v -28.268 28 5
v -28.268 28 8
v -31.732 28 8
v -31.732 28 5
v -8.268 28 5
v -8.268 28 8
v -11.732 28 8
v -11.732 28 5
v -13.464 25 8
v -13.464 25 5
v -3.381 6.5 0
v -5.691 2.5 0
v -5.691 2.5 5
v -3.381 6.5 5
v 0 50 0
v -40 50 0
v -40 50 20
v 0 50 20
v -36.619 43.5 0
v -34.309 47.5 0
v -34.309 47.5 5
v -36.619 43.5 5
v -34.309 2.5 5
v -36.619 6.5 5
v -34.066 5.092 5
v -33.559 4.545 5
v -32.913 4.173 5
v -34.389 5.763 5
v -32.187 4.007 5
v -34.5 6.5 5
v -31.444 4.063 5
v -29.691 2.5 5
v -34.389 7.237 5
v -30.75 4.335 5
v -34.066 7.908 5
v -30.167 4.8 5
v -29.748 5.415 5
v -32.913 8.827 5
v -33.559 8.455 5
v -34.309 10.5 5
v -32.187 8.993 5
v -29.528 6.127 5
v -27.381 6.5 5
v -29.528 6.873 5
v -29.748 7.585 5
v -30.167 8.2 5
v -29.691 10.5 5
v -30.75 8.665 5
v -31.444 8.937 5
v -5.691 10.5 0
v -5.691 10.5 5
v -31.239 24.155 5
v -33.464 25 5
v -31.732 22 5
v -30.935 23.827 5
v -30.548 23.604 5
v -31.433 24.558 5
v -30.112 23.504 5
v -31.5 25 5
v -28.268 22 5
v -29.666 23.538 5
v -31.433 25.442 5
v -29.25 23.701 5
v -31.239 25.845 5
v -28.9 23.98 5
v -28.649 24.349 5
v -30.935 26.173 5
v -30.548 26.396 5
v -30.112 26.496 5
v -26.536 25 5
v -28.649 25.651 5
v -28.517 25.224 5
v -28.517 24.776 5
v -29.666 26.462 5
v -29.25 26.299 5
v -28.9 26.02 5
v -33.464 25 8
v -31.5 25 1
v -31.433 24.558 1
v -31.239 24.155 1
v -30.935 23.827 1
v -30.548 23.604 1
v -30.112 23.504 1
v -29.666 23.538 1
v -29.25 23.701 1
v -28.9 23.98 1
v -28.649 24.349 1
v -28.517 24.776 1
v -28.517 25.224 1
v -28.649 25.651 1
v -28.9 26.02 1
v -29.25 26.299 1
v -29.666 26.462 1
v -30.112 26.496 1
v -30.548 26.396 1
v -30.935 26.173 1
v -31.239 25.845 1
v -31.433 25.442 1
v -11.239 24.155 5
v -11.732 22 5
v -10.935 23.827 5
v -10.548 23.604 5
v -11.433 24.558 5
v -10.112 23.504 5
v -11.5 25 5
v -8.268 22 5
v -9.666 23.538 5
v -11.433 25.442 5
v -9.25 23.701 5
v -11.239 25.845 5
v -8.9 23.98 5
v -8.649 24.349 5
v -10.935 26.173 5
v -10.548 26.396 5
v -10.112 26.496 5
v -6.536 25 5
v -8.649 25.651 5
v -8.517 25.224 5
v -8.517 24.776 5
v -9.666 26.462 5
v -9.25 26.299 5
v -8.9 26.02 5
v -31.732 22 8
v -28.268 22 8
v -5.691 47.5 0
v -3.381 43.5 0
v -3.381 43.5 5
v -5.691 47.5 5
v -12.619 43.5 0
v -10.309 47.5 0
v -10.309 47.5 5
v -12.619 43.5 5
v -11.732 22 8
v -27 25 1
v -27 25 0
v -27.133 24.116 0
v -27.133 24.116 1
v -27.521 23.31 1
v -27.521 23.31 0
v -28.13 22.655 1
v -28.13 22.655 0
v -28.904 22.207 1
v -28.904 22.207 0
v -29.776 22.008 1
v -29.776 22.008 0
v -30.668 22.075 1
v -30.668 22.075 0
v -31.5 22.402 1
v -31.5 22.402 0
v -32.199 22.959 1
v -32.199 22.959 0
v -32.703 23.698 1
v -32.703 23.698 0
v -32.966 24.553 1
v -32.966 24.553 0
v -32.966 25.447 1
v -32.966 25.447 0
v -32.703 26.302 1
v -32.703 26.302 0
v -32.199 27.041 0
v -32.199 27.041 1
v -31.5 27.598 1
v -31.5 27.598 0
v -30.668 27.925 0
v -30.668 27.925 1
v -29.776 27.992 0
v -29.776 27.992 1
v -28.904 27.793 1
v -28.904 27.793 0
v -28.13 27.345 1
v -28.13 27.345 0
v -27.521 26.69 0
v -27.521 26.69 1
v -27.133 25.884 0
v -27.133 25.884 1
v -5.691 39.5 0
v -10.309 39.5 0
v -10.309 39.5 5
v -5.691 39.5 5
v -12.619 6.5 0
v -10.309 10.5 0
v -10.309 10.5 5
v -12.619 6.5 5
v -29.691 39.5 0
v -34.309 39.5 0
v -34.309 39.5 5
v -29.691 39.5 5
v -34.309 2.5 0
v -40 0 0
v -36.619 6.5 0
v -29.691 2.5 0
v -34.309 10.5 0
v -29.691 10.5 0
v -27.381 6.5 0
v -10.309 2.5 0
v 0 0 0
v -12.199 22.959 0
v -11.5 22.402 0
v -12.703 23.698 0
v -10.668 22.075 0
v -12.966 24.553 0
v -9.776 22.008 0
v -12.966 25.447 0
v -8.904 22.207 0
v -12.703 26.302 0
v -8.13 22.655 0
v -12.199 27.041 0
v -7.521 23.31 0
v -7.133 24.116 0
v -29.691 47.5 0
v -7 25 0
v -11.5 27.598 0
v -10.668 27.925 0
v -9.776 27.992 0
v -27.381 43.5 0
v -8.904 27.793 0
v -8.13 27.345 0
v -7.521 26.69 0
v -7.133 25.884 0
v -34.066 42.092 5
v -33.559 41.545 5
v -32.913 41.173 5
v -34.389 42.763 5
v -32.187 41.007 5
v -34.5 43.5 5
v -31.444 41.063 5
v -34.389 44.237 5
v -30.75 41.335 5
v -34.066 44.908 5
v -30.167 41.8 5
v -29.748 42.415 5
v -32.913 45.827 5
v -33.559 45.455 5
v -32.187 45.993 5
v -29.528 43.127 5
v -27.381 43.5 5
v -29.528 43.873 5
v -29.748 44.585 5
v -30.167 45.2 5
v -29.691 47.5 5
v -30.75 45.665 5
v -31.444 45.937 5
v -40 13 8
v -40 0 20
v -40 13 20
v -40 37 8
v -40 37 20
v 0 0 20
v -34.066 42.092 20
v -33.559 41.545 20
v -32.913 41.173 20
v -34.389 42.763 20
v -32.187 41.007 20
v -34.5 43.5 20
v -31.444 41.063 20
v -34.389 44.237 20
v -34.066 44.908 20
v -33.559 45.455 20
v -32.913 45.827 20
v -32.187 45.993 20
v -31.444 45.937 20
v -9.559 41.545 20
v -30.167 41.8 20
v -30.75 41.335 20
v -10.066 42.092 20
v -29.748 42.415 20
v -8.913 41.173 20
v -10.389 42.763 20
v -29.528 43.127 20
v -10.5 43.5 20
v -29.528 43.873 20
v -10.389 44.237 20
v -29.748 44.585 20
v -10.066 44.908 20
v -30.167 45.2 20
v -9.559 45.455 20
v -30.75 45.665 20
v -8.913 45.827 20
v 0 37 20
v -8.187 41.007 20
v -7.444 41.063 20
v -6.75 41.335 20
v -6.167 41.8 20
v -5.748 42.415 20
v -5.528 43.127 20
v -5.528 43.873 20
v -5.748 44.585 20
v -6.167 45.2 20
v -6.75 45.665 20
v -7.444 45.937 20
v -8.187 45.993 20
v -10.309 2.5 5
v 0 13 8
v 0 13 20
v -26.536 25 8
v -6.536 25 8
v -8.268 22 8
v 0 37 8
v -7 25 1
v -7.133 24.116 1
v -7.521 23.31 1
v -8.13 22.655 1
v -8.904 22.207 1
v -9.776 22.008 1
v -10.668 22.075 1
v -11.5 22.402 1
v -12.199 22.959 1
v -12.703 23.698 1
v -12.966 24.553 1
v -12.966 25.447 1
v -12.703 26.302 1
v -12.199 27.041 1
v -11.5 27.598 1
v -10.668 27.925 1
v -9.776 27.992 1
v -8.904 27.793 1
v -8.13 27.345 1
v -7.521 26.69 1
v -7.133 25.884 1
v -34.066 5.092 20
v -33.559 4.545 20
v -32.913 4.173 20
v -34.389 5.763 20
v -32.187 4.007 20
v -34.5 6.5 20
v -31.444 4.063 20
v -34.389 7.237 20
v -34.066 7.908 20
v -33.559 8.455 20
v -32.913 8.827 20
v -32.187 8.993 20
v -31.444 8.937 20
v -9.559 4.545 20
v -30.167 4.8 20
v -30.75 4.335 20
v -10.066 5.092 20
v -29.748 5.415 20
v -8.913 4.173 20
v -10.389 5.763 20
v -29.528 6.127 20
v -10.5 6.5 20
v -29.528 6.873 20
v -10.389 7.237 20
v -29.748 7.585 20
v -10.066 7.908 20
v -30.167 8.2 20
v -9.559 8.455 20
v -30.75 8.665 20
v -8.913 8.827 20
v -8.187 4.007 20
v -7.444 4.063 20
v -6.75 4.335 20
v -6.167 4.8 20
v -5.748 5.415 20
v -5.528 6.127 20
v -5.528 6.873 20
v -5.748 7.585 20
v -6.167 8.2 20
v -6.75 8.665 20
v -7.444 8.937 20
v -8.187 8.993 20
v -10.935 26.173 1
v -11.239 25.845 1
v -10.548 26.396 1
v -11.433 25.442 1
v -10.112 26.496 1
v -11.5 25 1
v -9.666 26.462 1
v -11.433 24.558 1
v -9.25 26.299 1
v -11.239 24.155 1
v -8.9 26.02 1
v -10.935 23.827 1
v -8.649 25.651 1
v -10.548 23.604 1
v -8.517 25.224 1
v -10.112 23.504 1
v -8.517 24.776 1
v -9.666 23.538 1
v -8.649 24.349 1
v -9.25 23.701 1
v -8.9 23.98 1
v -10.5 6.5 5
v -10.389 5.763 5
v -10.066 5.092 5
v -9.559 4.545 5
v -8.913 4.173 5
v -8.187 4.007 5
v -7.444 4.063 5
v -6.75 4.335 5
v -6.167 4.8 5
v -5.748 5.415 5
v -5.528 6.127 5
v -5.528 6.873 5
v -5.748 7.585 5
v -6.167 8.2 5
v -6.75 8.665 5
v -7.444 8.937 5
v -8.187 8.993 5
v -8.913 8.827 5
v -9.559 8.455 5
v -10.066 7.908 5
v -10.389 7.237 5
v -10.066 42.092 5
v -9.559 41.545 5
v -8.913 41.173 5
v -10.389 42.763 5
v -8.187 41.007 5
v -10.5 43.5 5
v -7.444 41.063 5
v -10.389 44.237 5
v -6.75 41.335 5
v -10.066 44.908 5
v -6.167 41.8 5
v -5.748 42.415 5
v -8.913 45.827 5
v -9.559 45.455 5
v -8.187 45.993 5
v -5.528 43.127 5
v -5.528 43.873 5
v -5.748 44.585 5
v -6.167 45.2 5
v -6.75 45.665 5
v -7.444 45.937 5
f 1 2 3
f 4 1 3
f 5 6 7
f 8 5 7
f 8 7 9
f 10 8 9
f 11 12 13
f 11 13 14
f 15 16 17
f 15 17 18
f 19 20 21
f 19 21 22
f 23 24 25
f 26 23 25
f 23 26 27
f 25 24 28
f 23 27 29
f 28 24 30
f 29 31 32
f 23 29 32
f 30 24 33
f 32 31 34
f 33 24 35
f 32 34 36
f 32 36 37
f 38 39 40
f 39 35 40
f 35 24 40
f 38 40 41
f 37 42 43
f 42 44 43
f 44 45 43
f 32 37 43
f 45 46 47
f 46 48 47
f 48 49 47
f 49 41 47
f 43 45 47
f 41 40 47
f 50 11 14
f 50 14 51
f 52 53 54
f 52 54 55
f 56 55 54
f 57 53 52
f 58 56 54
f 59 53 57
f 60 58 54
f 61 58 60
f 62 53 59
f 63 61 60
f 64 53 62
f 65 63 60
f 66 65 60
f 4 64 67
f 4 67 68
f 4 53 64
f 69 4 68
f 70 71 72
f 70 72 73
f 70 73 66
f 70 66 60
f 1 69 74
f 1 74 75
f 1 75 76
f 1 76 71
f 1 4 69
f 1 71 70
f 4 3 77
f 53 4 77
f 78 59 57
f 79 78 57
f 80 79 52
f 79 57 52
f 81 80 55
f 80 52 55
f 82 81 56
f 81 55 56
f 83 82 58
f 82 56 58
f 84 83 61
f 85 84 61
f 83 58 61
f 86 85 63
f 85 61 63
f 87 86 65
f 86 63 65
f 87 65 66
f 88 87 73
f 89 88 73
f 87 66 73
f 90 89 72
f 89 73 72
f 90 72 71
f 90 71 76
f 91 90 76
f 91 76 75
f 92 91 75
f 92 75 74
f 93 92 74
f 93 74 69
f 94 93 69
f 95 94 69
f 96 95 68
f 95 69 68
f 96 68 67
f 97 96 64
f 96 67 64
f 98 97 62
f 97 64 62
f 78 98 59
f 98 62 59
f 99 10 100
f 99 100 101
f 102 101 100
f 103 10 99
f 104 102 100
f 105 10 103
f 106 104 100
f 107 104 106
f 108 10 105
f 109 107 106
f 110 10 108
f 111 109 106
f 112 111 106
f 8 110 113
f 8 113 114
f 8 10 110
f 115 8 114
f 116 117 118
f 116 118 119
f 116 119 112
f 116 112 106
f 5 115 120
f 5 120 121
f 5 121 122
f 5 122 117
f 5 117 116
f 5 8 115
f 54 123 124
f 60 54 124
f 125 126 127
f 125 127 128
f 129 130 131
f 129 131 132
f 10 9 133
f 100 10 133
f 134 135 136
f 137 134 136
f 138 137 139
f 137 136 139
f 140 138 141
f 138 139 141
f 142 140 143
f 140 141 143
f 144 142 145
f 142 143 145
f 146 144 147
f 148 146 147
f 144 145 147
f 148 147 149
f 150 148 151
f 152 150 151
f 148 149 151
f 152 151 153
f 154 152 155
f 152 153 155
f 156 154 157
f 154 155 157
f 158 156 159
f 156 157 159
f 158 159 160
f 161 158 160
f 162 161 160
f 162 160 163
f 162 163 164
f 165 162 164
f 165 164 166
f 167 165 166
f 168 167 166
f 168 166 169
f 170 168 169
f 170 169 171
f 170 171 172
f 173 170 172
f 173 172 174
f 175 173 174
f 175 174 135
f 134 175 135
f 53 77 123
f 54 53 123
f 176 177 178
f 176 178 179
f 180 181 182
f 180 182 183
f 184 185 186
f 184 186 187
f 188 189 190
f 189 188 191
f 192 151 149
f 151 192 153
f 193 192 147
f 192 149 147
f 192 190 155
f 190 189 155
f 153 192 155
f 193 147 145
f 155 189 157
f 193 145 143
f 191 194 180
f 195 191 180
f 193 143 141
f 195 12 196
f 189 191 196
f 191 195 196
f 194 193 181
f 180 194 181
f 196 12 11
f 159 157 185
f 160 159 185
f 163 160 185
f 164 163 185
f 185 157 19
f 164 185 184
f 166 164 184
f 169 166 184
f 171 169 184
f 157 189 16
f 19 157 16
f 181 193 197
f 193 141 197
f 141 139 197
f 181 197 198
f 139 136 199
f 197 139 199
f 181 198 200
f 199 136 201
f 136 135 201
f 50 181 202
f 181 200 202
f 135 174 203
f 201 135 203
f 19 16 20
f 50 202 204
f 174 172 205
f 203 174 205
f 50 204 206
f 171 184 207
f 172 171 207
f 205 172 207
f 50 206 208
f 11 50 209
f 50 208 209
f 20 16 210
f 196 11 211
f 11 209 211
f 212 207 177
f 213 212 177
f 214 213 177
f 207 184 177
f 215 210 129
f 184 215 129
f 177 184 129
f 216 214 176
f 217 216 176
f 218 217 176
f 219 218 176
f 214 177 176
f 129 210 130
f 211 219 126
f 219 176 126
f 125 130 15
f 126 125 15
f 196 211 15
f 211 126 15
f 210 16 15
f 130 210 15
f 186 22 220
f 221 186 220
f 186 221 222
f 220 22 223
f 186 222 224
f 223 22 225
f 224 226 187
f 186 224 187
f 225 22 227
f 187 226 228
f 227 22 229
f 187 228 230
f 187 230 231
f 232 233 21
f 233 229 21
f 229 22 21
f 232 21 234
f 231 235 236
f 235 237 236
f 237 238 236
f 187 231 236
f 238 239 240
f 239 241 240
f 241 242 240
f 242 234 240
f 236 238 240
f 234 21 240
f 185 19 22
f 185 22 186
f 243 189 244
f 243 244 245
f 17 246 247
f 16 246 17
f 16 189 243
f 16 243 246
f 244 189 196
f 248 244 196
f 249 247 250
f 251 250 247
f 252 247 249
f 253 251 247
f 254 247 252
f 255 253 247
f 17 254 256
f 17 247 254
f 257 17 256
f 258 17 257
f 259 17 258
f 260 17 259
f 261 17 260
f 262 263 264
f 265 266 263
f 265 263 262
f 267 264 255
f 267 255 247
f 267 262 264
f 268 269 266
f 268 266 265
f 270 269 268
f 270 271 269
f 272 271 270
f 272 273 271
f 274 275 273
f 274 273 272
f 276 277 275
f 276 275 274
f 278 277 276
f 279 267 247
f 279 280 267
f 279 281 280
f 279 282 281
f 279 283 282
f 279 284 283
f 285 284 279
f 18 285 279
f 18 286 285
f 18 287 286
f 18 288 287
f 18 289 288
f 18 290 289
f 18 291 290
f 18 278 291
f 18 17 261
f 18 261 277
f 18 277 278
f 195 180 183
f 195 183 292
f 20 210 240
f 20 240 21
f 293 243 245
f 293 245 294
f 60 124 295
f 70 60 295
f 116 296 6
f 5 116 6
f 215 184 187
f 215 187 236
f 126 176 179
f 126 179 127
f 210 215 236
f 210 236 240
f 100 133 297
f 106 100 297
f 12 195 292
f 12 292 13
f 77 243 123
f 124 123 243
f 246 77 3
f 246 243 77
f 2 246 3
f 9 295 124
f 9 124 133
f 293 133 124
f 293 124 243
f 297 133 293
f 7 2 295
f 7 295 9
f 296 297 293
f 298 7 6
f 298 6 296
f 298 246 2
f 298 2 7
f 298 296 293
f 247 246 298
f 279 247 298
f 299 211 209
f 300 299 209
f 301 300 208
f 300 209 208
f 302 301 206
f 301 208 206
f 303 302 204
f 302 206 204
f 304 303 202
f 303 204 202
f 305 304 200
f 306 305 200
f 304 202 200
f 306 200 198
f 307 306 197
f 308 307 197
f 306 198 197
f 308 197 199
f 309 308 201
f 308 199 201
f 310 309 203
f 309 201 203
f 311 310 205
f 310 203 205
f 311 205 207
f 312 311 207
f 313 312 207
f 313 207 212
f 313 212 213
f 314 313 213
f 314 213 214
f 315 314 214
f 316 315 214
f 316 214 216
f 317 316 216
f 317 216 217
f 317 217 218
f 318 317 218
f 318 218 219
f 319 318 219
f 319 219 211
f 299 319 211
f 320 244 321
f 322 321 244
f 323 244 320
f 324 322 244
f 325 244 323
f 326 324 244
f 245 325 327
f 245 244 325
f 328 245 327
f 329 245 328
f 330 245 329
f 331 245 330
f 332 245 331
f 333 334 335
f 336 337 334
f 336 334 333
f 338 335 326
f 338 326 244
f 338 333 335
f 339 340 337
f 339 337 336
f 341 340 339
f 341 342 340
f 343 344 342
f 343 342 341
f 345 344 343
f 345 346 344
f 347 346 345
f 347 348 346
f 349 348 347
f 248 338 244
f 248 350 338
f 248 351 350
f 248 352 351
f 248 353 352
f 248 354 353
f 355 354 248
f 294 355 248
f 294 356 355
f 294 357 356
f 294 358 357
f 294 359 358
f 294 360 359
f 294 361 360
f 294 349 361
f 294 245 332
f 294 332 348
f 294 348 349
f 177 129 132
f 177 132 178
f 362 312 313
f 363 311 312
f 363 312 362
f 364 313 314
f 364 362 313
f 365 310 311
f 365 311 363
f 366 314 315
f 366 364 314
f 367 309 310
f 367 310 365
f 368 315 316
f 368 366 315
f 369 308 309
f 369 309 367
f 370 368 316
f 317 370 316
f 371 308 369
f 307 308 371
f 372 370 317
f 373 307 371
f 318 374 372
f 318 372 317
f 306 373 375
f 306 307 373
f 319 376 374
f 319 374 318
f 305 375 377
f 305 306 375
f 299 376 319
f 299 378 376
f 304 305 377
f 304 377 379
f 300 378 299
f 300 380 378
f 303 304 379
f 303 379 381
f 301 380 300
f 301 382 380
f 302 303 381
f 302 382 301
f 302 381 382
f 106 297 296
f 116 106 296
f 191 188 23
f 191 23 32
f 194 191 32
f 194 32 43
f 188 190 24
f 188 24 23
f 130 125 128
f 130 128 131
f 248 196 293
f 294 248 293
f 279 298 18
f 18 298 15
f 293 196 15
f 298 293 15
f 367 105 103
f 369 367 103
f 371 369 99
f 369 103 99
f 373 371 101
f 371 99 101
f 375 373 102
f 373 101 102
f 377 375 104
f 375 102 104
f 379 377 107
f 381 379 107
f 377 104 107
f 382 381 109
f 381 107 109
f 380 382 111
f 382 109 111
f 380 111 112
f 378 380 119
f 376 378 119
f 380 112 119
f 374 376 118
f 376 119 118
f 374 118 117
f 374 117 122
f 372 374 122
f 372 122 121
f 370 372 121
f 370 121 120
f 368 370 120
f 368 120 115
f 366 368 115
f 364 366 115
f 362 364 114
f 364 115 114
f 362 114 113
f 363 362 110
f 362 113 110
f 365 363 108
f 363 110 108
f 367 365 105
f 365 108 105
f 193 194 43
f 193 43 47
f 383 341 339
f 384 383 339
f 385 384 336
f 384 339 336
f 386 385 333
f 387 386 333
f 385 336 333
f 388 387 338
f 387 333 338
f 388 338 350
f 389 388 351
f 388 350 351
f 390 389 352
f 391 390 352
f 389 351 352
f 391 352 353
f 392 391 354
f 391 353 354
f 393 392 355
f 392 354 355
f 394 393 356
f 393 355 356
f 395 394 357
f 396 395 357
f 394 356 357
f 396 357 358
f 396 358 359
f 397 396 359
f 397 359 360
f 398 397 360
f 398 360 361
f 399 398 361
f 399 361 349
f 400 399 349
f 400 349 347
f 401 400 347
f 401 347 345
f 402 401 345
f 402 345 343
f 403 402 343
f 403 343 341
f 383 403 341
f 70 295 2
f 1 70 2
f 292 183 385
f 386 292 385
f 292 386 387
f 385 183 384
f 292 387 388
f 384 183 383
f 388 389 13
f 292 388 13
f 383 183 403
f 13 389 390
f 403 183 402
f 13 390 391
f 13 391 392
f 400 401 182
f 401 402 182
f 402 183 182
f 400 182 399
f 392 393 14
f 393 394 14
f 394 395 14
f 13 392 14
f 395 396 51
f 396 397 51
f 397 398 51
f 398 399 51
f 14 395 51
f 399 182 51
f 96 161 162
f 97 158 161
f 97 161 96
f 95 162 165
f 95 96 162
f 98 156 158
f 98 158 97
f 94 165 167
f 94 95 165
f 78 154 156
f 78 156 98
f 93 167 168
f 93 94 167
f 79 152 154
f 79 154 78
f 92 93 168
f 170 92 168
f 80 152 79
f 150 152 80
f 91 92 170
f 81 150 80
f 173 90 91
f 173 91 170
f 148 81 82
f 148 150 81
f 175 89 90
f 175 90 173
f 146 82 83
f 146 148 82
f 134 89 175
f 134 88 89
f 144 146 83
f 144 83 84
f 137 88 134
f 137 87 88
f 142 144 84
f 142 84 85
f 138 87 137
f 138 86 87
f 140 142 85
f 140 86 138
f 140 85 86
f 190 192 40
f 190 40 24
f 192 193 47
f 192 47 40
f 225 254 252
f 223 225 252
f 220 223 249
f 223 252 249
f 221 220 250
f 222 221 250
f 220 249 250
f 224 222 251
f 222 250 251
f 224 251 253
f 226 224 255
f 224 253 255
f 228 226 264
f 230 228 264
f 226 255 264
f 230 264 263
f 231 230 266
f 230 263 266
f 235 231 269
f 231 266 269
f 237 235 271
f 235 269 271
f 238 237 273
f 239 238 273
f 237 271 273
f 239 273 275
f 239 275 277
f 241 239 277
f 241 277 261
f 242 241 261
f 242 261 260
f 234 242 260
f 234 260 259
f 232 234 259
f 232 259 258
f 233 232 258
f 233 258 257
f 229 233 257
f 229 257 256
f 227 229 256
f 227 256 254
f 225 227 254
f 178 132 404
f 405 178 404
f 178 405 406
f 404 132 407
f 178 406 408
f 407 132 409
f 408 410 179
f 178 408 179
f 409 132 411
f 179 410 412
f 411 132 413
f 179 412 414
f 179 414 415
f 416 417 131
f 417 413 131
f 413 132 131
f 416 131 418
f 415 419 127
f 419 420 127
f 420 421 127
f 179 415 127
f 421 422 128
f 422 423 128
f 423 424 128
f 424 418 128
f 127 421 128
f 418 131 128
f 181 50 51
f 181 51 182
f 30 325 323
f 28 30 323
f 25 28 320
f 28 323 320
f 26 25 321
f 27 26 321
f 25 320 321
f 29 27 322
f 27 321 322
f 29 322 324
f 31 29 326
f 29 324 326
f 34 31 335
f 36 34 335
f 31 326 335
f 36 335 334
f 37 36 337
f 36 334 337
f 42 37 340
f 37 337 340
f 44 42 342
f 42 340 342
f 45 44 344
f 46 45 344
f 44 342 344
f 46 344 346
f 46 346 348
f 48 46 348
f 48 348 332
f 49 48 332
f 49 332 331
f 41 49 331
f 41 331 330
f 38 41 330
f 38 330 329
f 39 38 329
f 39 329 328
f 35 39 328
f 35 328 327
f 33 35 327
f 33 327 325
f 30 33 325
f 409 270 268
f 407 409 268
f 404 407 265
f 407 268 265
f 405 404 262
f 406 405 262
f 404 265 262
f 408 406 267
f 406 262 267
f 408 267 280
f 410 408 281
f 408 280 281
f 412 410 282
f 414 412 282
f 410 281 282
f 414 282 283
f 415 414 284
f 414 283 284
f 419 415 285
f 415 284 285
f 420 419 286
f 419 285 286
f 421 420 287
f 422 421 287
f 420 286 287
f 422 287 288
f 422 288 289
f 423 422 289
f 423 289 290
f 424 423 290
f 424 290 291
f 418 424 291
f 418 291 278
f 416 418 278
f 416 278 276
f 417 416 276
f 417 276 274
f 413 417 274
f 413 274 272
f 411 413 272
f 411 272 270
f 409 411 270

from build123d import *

# Parameters (mm, degrees)
F0_W           = 40
F0_H           = 24
F1_DEPTH       = 8
F0_H_2         = 13
F2_DEPTH       = 20
F3_D           = 5
F5_DEPTH       = 5
F7_D           = 3
F7_CBORE_D     = 6
F7_CBORE_DEPTH = 1
F8_R           = 1.5
F9_DEPTH       = 3


with BuildPart() as f1:
    # F0 (on Top) → F1 (new body)
    with BuildSketch(Plane.XY):
        with Locations((-20, 25)):
            Rectangle(F0_W, F0_H)
    extrude(amount=F1_DEPTH)

    # F0 (on Top) → F2 (join)
    with BuildSketch(Plane.XY):
        with Locations((-20, 43.5)):
            Rectangle(F0_W, F0_H_2)
        with Locations((-20, 6.5)):
            Rectangle(F0_W, F0_H_2)
    extrude(amount=F2_DEPTH)

    # F3 (through all)
    with Locations(Plane(origin=(0, 0, 0), x_dir=(1, 0, 0), z_dir=(0, 0, -1))):
        with Locations((-8, -43.5), (-32, -43.5), (-32, -6.5), (-8, -6.5)):
            Hole(F3_D / 2)

    # F4 (on face) → F5 (cut)
    with BuildSketch(Plane.XY):
        Polygon((-29.6905989232, 10.5), (-34.3094010768, 10.5), (-36.6188021535, 6.5), (-34.3094010768, 2.5), (-29.6905989232, 2.5), (-27.3811978465, 6.5), align=None)
        Polygon((-5.6905989232, 10.5), (-10.3094010768, 10.5), (-12.6188021535, 6.5), (-10.3094010768, 2.5), (-5.6905989232, 2.5), (-3.3811978465, 6.5), align=None)
        Polygon((-5.6905989232, 47.5), (-10.3094010768, 47.5), (-12.6188021535, 43.5), (-10.3094010768, 39.5), (-5.6905989232, 39.5), (-3.3811978465, 43.5), align=None)
        Polygon((-29.6905989232, 47.5), (-34.3094010768, 47.5), (-36.6188021535, 43.5), (-34.3094010768, 39.5), (-29.6905989232, 39.5), (-27.3811978465, 43.5), align=None)
    extrude(amount=F5_DEPTH, mode=Mode.SUBTRACT)

    # F7 (through all)
    with Locations(Plane(origin=(0, 0, 0), x_dir=(1, 0, 0), z_dir=(0, 0, -1))):
        with Locations((-30, -25), (-10, -25)):
            CounterBoreHole(F7_D / 2, F7_CBORE_D / 2, F7_CBORE_DEPTH)

    # F8 (on face) → F9 (cut)
    with BuildSketch(Plane.XY.offset(8)):
        Polygon((-8.2679491924, 28), (-11.7320508076, 28), (-13.4641016151, 25), (-11.7320508076, 22), (-8.2679491924, 22), (-6.5358983849, 25), align=None)
        with Locations((-10, 25)):
            Circle(F8_R, mode=Mode.SUBTRACT)
        Polygon((-28.2679491924, 28), (-31.7320508076, 28), (-33.4641016151, 25), (-31.7320508076, 22), (-28.2679491924, 22), (-26.5358983849, 25), align=None)
        with Locations((-30, 25)):
            Circle(F8_R, mode=Mode.SUBTRACT)
    extrude(amount=-F9_DEPTH, mode=Mode.SUBTRACT)


solid = f1.part
